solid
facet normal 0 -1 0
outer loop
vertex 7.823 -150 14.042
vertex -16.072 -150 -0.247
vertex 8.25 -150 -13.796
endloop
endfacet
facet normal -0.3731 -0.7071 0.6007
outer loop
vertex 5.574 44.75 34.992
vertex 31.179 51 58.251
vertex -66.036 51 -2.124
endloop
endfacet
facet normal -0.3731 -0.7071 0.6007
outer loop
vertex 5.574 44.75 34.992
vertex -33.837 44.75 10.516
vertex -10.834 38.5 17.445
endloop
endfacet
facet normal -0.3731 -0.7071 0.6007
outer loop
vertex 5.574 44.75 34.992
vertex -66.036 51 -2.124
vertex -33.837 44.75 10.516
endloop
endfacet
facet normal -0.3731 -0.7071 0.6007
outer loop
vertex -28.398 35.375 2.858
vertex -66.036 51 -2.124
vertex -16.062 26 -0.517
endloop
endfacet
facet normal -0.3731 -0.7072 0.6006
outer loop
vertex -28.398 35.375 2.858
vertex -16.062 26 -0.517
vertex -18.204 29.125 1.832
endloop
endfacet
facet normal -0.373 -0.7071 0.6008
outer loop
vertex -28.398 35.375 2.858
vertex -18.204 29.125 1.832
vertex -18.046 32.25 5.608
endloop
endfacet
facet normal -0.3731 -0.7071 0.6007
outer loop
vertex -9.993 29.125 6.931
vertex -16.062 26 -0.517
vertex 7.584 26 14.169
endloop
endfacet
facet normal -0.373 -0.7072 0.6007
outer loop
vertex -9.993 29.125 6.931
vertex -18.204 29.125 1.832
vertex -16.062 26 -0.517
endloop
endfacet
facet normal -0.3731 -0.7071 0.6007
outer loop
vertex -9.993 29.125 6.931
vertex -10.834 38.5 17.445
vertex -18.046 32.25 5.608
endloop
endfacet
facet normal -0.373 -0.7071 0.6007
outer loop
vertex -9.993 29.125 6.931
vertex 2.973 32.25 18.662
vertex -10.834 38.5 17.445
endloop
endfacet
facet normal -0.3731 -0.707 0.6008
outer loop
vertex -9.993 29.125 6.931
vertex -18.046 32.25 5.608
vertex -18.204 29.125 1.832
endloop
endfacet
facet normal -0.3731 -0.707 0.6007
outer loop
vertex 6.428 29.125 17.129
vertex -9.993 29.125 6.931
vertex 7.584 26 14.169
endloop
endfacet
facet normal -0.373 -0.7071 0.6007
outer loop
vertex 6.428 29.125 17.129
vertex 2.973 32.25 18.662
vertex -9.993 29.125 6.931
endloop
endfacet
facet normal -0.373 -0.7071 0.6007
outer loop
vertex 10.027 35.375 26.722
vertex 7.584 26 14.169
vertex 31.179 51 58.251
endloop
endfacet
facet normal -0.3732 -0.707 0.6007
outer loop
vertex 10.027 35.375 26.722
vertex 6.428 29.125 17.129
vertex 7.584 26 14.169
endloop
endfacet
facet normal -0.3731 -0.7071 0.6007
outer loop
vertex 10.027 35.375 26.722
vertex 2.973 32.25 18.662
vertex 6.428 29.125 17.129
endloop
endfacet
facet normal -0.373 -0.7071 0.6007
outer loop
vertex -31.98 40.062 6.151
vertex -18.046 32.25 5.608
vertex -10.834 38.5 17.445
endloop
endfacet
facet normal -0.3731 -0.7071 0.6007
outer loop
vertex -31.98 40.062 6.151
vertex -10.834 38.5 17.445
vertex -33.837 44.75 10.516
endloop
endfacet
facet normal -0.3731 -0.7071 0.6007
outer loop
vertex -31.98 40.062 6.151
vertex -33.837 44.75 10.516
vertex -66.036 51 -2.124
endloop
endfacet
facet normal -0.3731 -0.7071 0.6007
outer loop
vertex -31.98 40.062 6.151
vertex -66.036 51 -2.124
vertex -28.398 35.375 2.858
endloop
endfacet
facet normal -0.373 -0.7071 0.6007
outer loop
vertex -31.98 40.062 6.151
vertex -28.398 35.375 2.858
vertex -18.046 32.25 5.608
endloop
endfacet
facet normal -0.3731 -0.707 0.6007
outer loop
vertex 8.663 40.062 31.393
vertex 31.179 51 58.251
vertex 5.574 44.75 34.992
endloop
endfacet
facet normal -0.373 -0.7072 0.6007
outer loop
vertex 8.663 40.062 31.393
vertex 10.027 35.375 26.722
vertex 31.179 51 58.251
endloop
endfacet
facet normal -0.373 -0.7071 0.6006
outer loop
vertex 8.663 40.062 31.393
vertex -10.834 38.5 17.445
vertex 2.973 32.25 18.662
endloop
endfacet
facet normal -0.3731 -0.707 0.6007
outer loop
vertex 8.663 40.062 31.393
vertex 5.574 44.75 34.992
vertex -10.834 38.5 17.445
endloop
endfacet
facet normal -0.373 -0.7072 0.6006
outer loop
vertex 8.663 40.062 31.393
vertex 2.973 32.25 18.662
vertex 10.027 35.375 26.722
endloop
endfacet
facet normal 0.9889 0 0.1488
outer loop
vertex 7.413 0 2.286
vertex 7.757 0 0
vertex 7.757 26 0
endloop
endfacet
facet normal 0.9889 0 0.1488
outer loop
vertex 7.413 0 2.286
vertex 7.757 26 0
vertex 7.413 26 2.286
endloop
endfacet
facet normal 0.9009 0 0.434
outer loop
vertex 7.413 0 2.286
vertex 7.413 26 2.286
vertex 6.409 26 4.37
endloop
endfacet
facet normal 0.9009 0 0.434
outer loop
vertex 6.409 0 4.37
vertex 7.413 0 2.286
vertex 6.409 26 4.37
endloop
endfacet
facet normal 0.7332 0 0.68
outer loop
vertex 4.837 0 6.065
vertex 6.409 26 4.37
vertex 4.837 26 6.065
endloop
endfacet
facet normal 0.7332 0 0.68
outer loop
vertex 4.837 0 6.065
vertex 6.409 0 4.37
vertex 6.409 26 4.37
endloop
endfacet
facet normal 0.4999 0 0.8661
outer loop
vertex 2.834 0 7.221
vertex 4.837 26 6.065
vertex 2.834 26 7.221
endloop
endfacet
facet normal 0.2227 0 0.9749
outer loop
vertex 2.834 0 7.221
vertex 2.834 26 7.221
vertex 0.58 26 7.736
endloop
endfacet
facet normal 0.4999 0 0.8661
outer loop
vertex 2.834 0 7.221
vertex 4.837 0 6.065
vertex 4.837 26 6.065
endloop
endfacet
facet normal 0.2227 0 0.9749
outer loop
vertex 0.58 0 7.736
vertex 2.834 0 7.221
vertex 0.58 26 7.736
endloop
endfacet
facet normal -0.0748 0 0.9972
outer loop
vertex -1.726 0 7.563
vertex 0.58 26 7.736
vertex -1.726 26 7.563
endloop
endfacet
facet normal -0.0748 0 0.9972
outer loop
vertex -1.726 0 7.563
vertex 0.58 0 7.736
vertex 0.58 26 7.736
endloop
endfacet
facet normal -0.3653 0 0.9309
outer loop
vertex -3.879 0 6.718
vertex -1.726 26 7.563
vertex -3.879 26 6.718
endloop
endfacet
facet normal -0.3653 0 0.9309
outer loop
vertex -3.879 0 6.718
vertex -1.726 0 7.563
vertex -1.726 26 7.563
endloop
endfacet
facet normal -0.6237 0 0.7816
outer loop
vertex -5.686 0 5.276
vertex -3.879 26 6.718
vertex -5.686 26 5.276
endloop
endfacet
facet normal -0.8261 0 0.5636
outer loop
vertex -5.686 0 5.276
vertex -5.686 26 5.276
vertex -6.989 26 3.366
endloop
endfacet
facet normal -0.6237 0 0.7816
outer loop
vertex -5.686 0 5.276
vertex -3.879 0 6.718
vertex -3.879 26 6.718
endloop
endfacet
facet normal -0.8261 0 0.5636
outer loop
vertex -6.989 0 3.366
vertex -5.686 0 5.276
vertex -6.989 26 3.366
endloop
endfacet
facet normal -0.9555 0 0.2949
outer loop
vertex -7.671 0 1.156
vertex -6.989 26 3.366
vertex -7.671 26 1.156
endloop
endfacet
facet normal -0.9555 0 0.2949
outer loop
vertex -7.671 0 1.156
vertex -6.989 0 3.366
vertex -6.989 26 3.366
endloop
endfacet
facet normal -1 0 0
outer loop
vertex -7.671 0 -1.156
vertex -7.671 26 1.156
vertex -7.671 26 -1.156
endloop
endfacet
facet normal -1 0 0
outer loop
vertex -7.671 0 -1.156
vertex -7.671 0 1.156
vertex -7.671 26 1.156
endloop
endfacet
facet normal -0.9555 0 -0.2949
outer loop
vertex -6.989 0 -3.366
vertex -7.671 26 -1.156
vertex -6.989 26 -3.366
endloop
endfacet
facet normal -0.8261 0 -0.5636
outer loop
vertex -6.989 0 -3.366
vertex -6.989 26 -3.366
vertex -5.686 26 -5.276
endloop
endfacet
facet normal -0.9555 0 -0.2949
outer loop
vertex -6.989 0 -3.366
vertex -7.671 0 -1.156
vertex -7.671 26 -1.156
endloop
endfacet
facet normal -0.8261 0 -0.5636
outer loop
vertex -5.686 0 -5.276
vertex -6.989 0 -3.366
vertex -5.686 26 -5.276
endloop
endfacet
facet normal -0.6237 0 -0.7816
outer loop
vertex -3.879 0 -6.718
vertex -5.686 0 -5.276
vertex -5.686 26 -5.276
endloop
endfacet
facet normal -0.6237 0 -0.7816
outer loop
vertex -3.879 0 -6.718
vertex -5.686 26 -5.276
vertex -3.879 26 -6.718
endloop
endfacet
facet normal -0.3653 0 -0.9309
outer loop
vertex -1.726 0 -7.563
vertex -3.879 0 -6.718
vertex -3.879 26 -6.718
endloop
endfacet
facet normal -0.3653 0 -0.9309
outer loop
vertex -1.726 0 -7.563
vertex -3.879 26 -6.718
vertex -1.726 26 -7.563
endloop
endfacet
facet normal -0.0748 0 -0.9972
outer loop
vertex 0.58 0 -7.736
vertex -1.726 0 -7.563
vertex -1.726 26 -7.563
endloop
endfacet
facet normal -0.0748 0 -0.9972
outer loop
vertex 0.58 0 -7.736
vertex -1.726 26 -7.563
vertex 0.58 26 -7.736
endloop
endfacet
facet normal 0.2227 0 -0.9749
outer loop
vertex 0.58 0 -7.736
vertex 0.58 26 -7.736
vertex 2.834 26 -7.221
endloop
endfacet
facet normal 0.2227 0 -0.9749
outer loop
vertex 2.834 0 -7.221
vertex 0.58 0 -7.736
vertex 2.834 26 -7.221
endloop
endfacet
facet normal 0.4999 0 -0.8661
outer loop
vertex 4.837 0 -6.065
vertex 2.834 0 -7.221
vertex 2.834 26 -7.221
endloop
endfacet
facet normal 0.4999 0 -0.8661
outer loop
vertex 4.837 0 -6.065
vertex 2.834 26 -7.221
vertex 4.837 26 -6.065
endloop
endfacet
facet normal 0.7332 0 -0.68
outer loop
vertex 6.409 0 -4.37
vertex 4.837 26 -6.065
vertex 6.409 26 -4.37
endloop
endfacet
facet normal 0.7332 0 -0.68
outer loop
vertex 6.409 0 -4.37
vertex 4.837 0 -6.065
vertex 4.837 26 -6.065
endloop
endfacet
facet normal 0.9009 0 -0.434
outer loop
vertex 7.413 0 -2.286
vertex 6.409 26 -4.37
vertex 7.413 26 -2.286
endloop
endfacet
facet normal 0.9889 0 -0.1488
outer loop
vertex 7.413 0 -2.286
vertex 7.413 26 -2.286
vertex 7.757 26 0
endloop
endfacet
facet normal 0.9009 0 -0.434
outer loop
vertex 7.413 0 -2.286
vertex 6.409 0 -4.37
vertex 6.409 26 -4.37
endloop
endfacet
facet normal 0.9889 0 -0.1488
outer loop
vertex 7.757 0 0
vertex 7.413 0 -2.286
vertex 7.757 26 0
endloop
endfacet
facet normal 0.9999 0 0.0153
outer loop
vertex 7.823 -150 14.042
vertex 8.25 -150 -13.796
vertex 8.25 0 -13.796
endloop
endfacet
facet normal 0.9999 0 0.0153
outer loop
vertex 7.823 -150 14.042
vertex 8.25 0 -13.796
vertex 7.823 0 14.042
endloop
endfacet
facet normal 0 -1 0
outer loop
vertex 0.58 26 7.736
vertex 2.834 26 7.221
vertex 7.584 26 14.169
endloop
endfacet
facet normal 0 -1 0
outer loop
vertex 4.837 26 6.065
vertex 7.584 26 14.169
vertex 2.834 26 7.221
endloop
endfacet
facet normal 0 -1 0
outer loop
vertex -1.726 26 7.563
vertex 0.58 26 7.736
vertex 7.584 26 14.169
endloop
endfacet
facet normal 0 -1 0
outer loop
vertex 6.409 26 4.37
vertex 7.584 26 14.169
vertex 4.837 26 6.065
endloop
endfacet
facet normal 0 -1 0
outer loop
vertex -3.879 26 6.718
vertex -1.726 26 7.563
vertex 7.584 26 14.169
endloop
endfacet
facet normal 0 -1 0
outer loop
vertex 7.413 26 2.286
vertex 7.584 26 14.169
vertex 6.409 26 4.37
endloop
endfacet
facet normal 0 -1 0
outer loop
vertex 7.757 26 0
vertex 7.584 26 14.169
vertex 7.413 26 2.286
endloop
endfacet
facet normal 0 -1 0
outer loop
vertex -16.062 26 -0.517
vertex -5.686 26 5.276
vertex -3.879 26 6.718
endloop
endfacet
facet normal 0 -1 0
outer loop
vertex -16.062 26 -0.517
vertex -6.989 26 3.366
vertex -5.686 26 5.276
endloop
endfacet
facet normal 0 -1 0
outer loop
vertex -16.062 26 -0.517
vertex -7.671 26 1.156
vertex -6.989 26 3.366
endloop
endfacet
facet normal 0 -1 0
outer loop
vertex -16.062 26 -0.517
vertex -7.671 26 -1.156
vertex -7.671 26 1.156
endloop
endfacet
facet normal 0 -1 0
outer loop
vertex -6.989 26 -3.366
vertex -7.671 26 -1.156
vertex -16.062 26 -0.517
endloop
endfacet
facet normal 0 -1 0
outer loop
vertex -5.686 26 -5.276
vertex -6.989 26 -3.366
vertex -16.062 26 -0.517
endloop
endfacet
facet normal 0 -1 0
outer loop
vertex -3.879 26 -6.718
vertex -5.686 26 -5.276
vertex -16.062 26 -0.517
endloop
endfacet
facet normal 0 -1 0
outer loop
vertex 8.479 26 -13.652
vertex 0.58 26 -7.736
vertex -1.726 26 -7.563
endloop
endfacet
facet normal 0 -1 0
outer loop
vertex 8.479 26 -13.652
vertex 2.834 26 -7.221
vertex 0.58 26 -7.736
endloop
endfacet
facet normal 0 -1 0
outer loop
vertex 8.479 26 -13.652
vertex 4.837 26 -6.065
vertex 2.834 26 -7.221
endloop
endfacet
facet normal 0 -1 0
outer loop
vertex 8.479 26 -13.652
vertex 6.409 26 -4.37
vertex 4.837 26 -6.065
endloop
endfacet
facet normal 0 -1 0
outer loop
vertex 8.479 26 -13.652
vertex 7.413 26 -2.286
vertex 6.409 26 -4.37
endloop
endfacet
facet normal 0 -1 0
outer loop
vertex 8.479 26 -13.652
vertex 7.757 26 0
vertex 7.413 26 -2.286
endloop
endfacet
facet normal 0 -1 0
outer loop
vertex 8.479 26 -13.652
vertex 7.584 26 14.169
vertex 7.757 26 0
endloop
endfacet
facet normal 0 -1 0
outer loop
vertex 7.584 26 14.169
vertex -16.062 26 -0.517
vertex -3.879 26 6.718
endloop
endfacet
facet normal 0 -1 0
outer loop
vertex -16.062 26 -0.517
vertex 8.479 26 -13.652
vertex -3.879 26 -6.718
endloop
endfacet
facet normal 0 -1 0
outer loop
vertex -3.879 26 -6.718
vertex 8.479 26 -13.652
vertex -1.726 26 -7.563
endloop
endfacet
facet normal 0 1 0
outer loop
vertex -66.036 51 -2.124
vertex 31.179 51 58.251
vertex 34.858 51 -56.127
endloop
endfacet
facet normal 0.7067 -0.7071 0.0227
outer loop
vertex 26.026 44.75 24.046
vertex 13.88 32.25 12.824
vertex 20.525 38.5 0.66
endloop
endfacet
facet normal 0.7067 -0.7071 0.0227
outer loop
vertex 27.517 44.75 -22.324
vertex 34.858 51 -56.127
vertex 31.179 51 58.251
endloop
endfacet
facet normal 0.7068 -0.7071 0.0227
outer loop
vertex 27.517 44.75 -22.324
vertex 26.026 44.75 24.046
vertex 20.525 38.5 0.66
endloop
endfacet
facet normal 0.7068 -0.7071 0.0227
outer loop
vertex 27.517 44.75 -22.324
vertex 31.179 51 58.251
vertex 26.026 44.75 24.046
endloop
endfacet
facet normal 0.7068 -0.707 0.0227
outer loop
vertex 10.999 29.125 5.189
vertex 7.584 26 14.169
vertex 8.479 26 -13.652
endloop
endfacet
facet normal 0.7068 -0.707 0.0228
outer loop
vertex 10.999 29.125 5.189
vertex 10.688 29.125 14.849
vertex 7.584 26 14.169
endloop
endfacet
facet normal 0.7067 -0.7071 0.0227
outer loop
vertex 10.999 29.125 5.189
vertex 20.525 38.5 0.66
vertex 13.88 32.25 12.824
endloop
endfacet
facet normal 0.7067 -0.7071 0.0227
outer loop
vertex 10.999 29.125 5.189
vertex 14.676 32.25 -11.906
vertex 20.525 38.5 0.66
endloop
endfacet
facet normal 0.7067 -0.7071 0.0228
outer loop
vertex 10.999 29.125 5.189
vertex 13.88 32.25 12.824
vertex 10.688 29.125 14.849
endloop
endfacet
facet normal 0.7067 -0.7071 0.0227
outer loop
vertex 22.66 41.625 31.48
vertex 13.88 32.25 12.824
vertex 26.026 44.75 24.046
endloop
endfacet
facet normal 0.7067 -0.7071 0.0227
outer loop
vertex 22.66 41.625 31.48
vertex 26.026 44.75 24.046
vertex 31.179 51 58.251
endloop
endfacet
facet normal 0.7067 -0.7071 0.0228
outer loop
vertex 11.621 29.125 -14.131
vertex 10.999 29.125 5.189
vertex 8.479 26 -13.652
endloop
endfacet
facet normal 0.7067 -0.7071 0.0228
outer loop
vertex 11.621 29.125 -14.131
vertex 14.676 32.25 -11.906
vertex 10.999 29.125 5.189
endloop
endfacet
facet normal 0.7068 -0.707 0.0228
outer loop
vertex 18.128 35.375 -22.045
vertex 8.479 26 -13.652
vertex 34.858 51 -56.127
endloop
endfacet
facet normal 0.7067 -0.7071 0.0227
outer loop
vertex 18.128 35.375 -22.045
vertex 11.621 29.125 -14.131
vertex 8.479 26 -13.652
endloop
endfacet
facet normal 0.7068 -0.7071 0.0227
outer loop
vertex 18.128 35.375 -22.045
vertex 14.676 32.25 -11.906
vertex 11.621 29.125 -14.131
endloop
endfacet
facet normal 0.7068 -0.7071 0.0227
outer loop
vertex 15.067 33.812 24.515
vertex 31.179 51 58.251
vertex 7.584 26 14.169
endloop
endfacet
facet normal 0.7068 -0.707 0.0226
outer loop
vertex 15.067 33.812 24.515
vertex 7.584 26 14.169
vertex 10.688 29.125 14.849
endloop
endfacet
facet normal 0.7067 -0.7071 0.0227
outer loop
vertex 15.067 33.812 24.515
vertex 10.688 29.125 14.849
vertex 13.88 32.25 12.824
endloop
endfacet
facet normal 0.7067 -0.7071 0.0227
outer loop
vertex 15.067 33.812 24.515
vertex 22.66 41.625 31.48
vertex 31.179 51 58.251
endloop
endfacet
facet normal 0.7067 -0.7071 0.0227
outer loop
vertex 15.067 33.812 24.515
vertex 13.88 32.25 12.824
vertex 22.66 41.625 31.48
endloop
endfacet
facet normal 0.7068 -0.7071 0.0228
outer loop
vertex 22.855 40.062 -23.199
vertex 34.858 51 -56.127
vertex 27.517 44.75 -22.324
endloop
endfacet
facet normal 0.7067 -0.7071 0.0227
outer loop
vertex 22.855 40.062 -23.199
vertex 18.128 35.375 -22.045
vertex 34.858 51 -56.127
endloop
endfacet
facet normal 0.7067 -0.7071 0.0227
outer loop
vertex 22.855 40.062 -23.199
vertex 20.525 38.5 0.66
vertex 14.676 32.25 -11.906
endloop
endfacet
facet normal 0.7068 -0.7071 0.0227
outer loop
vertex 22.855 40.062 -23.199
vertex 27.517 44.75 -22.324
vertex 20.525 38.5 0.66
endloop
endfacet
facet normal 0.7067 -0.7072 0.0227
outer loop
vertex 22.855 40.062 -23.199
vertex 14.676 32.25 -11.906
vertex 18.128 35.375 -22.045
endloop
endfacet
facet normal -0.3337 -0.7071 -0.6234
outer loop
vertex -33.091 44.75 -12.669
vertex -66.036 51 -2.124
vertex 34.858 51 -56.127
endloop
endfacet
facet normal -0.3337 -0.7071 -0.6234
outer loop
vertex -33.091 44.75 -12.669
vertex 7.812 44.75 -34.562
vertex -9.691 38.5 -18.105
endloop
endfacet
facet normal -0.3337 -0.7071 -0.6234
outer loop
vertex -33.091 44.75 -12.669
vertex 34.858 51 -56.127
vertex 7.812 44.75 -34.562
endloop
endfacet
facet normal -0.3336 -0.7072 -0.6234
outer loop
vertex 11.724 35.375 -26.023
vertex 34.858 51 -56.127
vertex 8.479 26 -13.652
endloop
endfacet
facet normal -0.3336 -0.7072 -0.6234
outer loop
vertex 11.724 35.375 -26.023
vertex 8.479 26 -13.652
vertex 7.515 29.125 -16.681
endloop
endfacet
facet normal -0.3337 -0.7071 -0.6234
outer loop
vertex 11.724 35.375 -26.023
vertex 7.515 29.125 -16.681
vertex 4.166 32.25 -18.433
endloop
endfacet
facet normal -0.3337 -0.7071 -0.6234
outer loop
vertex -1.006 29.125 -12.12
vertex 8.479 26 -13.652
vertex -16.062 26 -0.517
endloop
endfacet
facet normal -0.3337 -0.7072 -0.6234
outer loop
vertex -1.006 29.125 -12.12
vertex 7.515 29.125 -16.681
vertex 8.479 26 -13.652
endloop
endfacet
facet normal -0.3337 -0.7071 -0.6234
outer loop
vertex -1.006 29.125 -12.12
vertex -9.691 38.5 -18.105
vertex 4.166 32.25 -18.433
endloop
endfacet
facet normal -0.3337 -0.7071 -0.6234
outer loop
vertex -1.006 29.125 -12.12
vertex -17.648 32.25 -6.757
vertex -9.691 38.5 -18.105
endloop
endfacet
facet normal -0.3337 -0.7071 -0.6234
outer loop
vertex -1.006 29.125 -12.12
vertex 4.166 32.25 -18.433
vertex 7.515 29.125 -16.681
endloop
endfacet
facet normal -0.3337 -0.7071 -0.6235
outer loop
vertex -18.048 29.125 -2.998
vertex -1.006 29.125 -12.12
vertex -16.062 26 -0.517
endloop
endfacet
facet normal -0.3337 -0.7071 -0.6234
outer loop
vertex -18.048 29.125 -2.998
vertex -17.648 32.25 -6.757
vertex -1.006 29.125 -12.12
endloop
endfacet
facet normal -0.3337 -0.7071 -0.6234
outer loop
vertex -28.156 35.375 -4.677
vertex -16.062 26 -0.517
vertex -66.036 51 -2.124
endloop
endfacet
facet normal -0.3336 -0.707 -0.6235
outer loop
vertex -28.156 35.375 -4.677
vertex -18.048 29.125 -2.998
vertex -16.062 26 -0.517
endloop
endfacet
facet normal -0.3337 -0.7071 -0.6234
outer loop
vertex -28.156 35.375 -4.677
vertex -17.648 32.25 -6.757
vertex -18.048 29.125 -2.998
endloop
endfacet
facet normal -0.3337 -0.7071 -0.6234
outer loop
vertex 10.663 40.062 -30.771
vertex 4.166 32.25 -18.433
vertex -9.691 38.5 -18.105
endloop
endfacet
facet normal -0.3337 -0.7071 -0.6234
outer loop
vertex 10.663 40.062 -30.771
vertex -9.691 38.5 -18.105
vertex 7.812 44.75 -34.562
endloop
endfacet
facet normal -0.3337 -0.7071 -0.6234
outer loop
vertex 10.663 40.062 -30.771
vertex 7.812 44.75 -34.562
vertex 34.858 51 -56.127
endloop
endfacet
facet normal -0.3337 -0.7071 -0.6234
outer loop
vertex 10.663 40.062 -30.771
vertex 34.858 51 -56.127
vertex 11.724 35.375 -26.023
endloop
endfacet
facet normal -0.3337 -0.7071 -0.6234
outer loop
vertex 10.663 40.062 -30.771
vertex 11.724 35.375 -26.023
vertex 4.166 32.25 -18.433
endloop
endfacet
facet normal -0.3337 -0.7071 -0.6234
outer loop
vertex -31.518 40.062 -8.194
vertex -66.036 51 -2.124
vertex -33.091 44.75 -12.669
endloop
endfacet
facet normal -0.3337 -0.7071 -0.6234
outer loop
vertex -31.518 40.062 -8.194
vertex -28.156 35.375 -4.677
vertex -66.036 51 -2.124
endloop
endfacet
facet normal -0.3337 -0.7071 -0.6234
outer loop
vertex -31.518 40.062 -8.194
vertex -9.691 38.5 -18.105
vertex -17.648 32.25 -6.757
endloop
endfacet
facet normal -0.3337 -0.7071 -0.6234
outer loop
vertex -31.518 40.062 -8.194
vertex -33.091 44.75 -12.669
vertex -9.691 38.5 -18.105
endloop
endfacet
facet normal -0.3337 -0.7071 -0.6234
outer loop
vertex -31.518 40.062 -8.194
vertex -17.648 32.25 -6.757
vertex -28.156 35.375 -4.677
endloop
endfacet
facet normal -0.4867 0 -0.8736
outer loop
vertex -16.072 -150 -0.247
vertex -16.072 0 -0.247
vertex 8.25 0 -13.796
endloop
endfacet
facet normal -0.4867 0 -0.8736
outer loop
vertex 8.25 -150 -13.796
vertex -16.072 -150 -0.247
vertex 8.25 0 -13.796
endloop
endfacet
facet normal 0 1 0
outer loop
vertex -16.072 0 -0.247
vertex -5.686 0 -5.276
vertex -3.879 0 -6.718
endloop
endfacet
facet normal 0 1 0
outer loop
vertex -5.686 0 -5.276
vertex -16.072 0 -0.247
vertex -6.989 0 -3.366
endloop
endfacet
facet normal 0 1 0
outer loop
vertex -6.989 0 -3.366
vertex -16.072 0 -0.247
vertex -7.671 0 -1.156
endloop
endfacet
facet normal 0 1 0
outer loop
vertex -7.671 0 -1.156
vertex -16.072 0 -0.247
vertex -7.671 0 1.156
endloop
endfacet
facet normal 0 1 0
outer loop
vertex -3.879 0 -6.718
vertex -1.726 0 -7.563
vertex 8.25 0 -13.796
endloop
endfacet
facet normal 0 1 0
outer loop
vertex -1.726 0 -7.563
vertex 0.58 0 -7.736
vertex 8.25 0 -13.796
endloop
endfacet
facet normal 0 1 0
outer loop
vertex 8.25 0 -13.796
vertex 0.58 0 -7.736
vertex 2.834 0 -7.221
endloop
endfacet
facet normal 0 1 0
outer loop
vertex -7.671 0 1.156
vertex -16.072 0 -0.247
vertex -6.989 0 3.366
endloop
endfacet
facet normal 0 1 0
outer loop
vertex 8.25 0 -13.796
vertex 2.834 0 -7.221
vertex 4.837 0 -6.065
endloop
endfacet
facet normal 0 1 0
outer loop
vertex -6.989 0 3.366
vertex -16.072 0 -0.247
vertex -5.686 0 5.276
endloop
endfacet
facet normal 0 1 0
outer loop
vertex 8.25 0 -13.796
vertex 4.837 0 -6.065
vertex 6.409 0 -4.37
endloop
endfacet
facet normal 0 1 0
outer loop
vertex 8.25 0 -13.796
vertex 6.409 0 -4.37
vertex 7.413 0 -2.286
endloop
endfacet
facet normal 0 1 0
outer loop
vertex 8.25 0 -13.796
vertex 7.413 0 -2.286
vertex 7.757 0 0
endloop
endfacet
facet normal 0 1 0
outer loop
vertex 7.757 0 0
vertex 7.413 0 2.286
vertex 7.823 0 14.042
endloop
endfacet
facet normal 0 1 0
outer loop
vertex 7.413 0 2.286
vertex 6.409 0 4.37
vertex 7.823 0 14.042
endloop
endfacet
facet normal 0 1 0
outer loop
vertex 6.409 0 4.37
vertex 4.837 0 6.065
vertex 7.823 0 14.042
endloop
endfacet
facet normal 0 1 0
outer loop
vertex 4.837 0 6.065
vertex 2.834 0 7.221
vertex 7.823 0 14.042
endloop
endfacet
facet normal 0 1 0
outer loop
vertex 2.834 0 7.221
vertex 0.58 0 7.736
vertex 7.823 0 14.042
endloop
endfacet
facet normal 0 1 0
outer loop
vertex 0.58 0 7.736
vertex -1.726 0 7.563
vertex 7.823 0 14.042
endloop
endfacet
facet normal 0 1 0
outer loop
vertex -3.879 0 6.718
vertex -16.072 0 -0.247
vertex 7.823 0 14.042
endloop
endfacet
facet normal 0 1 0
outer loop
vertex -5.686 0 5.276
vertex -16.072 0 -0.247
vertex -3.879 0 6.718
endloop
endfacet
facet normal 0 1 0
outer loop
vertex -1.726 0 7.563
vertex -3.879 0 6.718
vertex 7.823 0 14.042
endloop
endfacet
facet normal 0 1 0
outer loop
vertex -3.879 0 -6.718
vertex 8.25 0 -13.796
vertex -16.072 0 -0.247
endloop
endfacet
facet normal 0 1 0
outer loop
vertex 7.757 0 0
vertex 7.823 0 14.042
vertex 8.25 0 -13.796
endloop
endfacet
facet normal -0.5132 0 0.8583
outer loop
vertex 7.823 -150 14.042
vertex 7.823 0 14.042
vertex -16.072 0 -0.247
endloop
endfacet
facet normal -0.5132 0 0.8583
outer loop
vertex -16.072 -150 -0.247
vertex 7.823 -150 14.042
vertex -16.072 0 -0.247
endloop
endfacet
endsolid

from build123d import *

# Parameters (mm, degrees)
F1_DEPTH = 150
F2_R     = 7.7571961337
F3_DEPTH = 26
F5_DEPTH = 25
F5_TAPER = -45


with BuildPart() as f1:
    # F0 (on Front) → F1 (new body)
    with BuildSketch(Plane.XZ):
        Polygon((7.8226845391, 14.0423364191), (-16.0723623369, -0.2465246729), (8.2496777979, -13.7958117462), align=None)
    extrude(amount=F1_DEPTH)

    # F2 (on Front) → F3 (join)
    with BuildSketch(Plane.XZ):
        Circle(F2_R)
    extrude(amount=-F3_DEPTH)

    # F4 (on face) → F5 (join)
    with BuildSketch(Plane(origin=(0, 26, 0), x_dir=(-1, 0, 0), z_dir=(0, 1, 0))):
        Polygon((-7.5836269453, 14.1686063395), (-8.4785595536, -13.6519167572), (16.0621864989, -0.5166895823), align=None)
    extrude(amount=F5_DEPTH, taper=F5_TAPER)


solid = f1.part
